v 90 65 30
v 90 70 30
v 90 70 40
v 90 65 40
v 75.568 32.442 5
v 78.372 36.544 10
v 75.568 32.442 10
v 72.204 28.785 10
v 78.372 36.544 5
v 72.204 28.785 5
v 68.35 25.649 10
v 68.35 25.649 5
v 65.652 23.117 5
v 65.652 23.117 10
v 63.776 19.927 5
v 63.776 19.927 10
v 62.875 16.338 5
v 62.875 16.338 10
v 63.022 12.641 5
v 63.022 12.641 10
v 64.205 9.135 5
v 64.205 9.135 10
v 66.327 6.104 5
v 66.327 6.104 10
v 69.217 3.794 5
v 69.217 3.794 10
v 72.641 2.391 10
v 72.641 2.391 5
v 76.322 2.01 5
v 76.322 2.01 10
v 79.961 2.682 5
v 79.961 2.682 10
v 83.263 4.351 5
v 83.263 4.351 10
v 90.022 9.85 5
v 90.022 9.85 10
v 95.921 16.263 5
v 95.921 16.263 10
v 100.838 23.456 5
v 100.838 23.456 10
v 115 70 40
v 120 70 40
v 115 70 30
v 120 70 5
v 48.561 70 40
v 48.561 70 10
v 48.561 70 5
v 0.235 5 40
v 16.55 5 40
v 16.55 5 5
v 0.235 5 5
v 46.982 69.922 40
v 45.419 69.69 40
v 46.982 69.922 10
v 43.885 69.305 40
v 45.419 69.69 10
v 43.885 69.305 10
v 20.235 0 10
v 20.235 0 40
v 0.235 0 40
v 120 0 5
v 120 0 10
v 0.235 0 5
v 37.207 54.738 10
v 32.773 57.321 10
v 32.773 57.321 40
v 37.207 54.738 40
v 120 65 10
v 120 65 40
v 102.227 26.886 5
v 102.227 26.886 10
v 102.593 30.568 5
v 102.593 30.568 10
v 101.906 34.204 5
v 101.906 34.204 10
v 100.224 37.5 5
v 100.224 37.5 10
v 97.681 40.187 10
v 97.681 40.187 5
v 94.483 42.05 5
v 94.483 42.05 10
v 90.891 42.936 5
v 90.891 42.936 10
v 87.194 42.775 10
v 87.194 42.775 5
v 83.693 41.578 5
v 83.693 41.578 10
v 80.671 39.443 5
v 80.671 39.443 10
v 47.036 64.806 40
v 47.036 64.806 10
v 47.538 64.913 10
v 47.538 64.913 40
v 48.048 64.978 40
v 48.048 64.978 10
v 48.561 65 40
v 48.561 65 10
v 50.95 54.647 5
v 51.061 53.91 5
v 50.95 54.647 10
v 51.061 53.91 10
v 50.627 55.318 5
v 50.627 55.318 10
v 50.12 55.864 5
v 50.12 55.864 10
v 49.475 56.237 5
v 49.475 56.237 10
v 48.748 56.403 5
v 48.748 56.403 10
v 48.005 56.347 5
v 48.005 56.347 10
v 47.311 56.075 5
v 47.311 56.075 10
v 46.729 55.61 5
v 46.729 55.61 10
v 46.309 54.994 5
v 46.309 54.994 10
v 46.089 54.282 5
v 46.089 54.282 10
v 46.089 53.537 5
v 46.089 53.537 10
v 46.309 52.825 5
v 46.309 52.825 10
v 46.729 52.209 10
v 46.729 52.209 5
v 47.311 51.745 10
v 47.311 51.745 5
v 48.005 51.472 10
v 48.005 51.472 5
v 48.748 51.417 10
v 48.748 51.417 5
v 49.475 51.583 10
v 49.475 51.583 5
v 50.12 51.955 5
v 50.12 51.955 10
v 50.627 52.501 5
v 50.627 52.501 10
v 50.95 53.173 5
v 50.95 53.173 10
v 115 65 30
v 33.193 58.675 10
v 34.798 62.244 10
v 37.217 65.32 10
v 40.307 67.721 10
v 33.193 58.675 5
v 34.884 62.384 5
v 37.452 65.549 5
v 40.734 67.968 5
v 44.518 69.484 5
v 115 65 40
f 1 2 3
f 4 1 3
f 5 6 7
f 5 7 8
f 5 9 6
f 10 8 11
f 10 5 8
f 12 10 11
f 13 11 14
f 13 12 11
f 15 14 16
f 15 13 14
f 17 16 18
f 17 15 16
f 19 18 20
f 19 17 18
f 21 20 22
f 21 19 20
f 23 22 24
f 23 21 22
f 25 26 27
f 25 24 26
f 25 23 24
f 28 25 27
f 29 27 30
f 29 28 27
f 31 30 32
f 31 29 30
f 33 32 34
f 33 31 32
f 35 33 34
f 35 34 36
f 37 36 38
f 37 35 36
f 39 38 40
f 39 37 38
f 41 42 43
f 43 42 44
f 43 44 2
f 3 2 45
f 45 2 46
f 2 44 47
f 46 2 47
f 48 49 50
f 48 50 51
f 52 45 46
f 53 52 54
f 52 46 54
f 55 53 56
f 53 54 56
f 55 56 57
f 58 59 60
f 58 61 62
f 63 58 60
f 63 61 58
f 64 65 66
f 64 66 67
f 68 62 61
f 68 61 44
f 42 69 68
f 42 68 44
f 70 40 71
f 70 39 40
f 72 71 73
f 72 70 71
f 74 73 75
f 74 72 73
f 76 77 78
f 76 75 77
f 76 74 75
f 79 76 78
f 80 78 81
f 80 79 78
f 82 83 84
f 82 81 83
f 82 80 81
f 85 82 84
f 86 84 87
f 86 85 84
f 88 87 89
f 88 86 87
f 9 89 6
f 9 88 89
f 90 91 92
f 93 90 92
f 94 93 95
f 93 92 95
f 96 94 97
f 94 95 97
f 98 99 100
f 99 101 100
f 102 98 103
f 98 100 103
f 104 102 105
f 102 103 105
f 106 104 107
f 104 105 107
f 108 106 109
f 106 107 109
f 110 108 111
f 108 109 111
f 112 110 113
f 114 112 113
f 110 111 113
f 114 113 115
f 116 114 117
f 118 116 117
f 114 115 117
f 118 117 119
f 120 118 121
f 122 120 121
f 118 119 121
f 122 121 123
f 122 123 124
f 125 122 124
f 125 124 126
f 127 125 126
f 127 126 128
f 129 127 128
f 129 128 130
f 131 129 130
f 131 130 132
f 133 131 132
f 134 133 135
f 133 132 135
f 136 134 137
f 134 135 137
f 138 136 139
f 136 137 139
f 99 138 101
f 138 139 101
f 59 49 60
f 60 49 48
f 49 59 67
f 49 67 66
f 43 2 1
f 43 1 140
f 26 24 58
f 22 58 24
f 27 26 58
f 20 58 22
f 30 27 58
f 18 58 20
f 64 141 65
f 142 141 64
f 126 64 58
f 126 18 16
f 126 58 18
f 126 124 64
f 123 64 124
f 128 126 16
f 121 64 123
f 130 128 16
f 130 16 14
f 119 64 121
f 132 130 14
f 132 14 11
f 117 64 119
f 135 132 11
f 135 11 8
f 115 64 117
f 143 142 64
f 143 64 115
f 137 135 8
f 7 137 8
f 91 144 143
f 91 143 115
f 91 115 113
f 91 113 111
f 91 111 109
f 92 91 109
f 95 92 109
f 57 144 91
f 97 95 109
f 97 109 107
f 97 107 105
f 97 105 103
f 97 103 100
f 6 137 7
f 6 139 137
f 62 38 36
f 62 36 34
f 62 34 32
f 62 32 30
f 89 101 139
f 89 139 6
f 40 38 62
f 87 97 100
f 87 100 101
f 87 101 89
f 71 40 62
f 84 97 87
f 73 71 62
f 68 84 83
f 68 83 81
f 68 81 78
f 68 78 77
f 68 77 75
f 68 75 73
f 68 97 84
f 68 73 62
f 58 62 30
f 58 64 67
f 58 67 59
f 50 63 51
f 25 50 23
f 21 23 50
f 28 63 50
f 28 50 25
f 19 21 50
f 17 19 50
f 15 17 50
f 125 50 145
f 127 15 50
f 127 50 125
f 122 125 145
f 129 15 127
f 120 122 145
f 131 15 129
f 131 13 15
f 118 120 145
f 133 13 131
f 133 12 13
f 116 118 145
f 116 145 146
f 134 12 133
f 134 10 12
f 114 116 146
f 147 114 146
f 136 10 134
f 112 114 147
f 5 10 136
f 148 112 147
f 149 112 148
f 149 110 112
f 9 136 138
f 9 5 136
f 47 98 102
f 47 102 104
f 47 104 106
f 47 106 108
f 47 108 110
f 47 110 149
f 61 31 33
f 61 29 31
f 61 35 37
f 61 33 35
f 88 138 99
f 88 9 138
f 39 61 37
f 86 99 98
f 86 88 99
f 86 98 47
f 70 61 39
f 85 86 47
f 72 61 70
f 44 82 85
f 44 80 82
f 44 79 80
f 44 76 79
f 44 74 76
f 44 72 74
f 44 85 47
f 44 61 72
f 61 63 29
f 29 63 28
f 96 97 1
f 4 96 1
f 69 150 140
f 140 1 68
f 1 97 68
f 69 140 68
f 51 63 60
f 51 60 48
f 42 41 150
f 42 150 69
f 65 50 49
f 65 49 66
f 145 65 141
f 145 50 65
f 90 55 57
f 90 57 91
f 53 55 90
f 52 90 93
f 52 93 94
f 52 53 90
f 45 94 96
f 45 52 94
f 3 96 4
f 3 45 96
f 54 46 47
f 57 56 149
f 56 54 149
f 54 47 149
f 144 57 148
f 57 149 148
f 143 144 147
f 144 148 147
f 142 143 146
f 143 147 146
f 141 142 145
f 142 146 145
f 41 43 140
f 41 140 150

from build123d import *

# Parameters (mm, degrees)
SKETCH1_W           = 120
SKETCH1_H           = 100
BOSS_EXTRUDE1_DEPTH = 5
SKETCH2_R           = 2.5
CUT_EXTRUDE1_DEPTH  = 6
CUT_EXTRUDE3_DEPTH  = 10
BOSS_EXTRUDE3_DEPTH = 30
SKETCH8_W           = 20
SKETCH8_H           = 5
BOSS_EXTRUDE4_DEPTH = 35
SKETCH9_W           = 25
SKETCH9_H           = 10
CUT_EXTRUDE4_DEPTH  = 71
SKETCH10_W          = 35
SKETCH10_H          = 70
CUT_EXTRUDE5_DEPTH  = 120.765167123


with BuildPart() as part:
    # Sketch1 → Boss-Extrude1 (new body)
    with BuildSketch(Plane.XY):
        with Locations((60, 50)):
            Rectangle(SKETCH1_W, SKETCH1_H)
    boss_extrude1 = extrude(amount=BOSS_EXTRUDE1_DEPTH)

    # Sketch2 → Cut-Extrude1 (cut, through all)
    with BuildSketch(Plane.XY.offset(5)):
        with Locations((48.561388608, 53.909722104)):
            Circle(SKETCH2_R)
        with BuildLine():
            ThreePointArc((83.262763007, 4.351023424), (93.087143476, 12.949898455), (100.837944203, 23.456286582))
            ThreePointArc((100.837944203, 23.456286582), (96.148678733, 41.232978888), (78.371986427, 36.543713418))
            ThreePointArc((78.371986427, 36.543713418), (73.952108326, 30.552467296), (68.349775662, 25.648976576))
            ThreePointArc((68.349775662, 25.648976576), (65.157292759, 7.543506327), (83.262763007, 4.351023424))
        make_face()
    cut_extrude1 = extrude(amount=-CUT_EXTRUDE1_DEPTH, mode=Mode.SUBTRACT)

    # Sketch5 → Cut-Extrude3 (cut)
    with BuildSketch(Plane.XY.offset(5)):
        with BuildLine():
            Line((120, 70), (48.561388608, 70))
            ThreePointArc((48.561388608, 70), (39.016134462, 66.862913451), (33.192915272, 58.674915711))
            Line((33.192915272, 58.674915711), (15, 0))
            Line((15, 0), (0, 0))
            Line((0, 0), (0, 100))
            Line((0, 100), (120, 100))
            Line((120, 100), (120, 70))
        make_face()
    cut_extrude3 = extrude(amount=-CUT_EXTRUDE3_DEPTH, mode=Mode.SUBTRACT)

    # Sketch7 → Boss-Extrude3 (add)
    with BuildSketch(Plane(origin=(0, 0, 0), x_dir=(-1, 0, 0), z_dir=(0, 0, -1))):
        Polygon((-15, 0), (-32.773002065, 57.320631823), (-37.206950606, 54.737658166), (-20.234832877, 0), align=None)
        with BuildLine():
            Line((-120, 70), (-48.561388608, 70))
            ThreePointArc((-48.561388608, 70), (-46.197570118, 69.825418913), (-43.885046952, 69.305464096))
            Line((-43.885046952, 69.305464096), (-47.035737431, 64.805811769))
            ThreePointArc((-47.035737431, 64.805811769), (-47.792408669, 64.951257894), (-48.561388608, 65))
            Line((-48.561388608, 65), (-120, 65))
            Line((-120, 65), (-120, 70))
        make_face()
    boss_extrude3 = extrude(amount=BOSS_EXTRUDE3_DEPTH)

    # Sketch8 → Boss-Extrude4 (add, through all)
    with BuildSketch(Plane(origin=(0, 0, -30), x_dir=(-1, 0, 0), z_dir=(0, 0, -1))):
        with Locations((-10.234832877, 2.5)):
            Rectangle(SKETCH8_W, SKETCH8_H)
    boss_extrude4 = extrude(amount=-BOSS_EXTRUDE4_DEPTH)

    # Sketch9 → Cut-Extrude4 (cut, through all)
    with BuildSketch(Plane(origin=(0, 70, 0), x_dir=(1, 0, 0), z_dir=(0, 1, 0))):
        with Locations((102.5, 25)):
            Rectangle(SKETCH9_W, SKETCH9_H)
    cut_extrude4 = extrude(amount=-CUT_EXTRUDE4_DEPTH, mode=Mode.SUBTRACT)

    # Mirror1: Boss-Extrude1, Cut-Extrude1, Cut-Extrude3, Boss-Extrude3, Boss-Extrude4, Cut-Extrude4 across plane
    add(boss_extrude1.mirror(Plane(origin=(0, 0, 5), x_dir=(1, 0, 0), z_dir=(0, 0, -1))))
    add(cut_extrude1.mirror(Plane(origin=(0, 0, 5), x_dir=(1, 0, 0), z_dir=(0, 0, -1))), mode=Mode.SUBTRACT)
    add(cut_extrude3.mirror(Plane(origin=(0, 0, 5), x_dir=(1, 0, 0), z_dir=(0, 0, -1))), mode=Mode.SUBTRACT)
    add(boss_extrude3.mirror(Plane(origin=(0, 0, 5), x_dir=(1, 0, 0), z_dir=(0, 0, -1))))
    add(boss_extrude4.mirror(Plane(origin=(0, 0, 5), x_dir=(1, 0, 0), z_dir=(0, 0, -1))))
    add(cut_extrude4.mirror(Plane(origin=(0, 0, 5), x_dir=(1, 0, 0), z_dir=(0, 0, -1))), mode=Mode.SUBTRACT)

    # Sketch10 → Cut-Extrude5 (cut, through all)
    with BuildSketch(Plane(origin=(120, 0, 0), x_dir=(0, 0, -1), z_dir=(1, 0, 0))):
        with Locations((12.5, 35)):
            Rectangle(SKETCH10_W, SKETCH10_H)
    extrude(amount=-CUT_EXTRUDE5_DEPTH, mode=Mode.SUBTRACT)


solid = part.part
